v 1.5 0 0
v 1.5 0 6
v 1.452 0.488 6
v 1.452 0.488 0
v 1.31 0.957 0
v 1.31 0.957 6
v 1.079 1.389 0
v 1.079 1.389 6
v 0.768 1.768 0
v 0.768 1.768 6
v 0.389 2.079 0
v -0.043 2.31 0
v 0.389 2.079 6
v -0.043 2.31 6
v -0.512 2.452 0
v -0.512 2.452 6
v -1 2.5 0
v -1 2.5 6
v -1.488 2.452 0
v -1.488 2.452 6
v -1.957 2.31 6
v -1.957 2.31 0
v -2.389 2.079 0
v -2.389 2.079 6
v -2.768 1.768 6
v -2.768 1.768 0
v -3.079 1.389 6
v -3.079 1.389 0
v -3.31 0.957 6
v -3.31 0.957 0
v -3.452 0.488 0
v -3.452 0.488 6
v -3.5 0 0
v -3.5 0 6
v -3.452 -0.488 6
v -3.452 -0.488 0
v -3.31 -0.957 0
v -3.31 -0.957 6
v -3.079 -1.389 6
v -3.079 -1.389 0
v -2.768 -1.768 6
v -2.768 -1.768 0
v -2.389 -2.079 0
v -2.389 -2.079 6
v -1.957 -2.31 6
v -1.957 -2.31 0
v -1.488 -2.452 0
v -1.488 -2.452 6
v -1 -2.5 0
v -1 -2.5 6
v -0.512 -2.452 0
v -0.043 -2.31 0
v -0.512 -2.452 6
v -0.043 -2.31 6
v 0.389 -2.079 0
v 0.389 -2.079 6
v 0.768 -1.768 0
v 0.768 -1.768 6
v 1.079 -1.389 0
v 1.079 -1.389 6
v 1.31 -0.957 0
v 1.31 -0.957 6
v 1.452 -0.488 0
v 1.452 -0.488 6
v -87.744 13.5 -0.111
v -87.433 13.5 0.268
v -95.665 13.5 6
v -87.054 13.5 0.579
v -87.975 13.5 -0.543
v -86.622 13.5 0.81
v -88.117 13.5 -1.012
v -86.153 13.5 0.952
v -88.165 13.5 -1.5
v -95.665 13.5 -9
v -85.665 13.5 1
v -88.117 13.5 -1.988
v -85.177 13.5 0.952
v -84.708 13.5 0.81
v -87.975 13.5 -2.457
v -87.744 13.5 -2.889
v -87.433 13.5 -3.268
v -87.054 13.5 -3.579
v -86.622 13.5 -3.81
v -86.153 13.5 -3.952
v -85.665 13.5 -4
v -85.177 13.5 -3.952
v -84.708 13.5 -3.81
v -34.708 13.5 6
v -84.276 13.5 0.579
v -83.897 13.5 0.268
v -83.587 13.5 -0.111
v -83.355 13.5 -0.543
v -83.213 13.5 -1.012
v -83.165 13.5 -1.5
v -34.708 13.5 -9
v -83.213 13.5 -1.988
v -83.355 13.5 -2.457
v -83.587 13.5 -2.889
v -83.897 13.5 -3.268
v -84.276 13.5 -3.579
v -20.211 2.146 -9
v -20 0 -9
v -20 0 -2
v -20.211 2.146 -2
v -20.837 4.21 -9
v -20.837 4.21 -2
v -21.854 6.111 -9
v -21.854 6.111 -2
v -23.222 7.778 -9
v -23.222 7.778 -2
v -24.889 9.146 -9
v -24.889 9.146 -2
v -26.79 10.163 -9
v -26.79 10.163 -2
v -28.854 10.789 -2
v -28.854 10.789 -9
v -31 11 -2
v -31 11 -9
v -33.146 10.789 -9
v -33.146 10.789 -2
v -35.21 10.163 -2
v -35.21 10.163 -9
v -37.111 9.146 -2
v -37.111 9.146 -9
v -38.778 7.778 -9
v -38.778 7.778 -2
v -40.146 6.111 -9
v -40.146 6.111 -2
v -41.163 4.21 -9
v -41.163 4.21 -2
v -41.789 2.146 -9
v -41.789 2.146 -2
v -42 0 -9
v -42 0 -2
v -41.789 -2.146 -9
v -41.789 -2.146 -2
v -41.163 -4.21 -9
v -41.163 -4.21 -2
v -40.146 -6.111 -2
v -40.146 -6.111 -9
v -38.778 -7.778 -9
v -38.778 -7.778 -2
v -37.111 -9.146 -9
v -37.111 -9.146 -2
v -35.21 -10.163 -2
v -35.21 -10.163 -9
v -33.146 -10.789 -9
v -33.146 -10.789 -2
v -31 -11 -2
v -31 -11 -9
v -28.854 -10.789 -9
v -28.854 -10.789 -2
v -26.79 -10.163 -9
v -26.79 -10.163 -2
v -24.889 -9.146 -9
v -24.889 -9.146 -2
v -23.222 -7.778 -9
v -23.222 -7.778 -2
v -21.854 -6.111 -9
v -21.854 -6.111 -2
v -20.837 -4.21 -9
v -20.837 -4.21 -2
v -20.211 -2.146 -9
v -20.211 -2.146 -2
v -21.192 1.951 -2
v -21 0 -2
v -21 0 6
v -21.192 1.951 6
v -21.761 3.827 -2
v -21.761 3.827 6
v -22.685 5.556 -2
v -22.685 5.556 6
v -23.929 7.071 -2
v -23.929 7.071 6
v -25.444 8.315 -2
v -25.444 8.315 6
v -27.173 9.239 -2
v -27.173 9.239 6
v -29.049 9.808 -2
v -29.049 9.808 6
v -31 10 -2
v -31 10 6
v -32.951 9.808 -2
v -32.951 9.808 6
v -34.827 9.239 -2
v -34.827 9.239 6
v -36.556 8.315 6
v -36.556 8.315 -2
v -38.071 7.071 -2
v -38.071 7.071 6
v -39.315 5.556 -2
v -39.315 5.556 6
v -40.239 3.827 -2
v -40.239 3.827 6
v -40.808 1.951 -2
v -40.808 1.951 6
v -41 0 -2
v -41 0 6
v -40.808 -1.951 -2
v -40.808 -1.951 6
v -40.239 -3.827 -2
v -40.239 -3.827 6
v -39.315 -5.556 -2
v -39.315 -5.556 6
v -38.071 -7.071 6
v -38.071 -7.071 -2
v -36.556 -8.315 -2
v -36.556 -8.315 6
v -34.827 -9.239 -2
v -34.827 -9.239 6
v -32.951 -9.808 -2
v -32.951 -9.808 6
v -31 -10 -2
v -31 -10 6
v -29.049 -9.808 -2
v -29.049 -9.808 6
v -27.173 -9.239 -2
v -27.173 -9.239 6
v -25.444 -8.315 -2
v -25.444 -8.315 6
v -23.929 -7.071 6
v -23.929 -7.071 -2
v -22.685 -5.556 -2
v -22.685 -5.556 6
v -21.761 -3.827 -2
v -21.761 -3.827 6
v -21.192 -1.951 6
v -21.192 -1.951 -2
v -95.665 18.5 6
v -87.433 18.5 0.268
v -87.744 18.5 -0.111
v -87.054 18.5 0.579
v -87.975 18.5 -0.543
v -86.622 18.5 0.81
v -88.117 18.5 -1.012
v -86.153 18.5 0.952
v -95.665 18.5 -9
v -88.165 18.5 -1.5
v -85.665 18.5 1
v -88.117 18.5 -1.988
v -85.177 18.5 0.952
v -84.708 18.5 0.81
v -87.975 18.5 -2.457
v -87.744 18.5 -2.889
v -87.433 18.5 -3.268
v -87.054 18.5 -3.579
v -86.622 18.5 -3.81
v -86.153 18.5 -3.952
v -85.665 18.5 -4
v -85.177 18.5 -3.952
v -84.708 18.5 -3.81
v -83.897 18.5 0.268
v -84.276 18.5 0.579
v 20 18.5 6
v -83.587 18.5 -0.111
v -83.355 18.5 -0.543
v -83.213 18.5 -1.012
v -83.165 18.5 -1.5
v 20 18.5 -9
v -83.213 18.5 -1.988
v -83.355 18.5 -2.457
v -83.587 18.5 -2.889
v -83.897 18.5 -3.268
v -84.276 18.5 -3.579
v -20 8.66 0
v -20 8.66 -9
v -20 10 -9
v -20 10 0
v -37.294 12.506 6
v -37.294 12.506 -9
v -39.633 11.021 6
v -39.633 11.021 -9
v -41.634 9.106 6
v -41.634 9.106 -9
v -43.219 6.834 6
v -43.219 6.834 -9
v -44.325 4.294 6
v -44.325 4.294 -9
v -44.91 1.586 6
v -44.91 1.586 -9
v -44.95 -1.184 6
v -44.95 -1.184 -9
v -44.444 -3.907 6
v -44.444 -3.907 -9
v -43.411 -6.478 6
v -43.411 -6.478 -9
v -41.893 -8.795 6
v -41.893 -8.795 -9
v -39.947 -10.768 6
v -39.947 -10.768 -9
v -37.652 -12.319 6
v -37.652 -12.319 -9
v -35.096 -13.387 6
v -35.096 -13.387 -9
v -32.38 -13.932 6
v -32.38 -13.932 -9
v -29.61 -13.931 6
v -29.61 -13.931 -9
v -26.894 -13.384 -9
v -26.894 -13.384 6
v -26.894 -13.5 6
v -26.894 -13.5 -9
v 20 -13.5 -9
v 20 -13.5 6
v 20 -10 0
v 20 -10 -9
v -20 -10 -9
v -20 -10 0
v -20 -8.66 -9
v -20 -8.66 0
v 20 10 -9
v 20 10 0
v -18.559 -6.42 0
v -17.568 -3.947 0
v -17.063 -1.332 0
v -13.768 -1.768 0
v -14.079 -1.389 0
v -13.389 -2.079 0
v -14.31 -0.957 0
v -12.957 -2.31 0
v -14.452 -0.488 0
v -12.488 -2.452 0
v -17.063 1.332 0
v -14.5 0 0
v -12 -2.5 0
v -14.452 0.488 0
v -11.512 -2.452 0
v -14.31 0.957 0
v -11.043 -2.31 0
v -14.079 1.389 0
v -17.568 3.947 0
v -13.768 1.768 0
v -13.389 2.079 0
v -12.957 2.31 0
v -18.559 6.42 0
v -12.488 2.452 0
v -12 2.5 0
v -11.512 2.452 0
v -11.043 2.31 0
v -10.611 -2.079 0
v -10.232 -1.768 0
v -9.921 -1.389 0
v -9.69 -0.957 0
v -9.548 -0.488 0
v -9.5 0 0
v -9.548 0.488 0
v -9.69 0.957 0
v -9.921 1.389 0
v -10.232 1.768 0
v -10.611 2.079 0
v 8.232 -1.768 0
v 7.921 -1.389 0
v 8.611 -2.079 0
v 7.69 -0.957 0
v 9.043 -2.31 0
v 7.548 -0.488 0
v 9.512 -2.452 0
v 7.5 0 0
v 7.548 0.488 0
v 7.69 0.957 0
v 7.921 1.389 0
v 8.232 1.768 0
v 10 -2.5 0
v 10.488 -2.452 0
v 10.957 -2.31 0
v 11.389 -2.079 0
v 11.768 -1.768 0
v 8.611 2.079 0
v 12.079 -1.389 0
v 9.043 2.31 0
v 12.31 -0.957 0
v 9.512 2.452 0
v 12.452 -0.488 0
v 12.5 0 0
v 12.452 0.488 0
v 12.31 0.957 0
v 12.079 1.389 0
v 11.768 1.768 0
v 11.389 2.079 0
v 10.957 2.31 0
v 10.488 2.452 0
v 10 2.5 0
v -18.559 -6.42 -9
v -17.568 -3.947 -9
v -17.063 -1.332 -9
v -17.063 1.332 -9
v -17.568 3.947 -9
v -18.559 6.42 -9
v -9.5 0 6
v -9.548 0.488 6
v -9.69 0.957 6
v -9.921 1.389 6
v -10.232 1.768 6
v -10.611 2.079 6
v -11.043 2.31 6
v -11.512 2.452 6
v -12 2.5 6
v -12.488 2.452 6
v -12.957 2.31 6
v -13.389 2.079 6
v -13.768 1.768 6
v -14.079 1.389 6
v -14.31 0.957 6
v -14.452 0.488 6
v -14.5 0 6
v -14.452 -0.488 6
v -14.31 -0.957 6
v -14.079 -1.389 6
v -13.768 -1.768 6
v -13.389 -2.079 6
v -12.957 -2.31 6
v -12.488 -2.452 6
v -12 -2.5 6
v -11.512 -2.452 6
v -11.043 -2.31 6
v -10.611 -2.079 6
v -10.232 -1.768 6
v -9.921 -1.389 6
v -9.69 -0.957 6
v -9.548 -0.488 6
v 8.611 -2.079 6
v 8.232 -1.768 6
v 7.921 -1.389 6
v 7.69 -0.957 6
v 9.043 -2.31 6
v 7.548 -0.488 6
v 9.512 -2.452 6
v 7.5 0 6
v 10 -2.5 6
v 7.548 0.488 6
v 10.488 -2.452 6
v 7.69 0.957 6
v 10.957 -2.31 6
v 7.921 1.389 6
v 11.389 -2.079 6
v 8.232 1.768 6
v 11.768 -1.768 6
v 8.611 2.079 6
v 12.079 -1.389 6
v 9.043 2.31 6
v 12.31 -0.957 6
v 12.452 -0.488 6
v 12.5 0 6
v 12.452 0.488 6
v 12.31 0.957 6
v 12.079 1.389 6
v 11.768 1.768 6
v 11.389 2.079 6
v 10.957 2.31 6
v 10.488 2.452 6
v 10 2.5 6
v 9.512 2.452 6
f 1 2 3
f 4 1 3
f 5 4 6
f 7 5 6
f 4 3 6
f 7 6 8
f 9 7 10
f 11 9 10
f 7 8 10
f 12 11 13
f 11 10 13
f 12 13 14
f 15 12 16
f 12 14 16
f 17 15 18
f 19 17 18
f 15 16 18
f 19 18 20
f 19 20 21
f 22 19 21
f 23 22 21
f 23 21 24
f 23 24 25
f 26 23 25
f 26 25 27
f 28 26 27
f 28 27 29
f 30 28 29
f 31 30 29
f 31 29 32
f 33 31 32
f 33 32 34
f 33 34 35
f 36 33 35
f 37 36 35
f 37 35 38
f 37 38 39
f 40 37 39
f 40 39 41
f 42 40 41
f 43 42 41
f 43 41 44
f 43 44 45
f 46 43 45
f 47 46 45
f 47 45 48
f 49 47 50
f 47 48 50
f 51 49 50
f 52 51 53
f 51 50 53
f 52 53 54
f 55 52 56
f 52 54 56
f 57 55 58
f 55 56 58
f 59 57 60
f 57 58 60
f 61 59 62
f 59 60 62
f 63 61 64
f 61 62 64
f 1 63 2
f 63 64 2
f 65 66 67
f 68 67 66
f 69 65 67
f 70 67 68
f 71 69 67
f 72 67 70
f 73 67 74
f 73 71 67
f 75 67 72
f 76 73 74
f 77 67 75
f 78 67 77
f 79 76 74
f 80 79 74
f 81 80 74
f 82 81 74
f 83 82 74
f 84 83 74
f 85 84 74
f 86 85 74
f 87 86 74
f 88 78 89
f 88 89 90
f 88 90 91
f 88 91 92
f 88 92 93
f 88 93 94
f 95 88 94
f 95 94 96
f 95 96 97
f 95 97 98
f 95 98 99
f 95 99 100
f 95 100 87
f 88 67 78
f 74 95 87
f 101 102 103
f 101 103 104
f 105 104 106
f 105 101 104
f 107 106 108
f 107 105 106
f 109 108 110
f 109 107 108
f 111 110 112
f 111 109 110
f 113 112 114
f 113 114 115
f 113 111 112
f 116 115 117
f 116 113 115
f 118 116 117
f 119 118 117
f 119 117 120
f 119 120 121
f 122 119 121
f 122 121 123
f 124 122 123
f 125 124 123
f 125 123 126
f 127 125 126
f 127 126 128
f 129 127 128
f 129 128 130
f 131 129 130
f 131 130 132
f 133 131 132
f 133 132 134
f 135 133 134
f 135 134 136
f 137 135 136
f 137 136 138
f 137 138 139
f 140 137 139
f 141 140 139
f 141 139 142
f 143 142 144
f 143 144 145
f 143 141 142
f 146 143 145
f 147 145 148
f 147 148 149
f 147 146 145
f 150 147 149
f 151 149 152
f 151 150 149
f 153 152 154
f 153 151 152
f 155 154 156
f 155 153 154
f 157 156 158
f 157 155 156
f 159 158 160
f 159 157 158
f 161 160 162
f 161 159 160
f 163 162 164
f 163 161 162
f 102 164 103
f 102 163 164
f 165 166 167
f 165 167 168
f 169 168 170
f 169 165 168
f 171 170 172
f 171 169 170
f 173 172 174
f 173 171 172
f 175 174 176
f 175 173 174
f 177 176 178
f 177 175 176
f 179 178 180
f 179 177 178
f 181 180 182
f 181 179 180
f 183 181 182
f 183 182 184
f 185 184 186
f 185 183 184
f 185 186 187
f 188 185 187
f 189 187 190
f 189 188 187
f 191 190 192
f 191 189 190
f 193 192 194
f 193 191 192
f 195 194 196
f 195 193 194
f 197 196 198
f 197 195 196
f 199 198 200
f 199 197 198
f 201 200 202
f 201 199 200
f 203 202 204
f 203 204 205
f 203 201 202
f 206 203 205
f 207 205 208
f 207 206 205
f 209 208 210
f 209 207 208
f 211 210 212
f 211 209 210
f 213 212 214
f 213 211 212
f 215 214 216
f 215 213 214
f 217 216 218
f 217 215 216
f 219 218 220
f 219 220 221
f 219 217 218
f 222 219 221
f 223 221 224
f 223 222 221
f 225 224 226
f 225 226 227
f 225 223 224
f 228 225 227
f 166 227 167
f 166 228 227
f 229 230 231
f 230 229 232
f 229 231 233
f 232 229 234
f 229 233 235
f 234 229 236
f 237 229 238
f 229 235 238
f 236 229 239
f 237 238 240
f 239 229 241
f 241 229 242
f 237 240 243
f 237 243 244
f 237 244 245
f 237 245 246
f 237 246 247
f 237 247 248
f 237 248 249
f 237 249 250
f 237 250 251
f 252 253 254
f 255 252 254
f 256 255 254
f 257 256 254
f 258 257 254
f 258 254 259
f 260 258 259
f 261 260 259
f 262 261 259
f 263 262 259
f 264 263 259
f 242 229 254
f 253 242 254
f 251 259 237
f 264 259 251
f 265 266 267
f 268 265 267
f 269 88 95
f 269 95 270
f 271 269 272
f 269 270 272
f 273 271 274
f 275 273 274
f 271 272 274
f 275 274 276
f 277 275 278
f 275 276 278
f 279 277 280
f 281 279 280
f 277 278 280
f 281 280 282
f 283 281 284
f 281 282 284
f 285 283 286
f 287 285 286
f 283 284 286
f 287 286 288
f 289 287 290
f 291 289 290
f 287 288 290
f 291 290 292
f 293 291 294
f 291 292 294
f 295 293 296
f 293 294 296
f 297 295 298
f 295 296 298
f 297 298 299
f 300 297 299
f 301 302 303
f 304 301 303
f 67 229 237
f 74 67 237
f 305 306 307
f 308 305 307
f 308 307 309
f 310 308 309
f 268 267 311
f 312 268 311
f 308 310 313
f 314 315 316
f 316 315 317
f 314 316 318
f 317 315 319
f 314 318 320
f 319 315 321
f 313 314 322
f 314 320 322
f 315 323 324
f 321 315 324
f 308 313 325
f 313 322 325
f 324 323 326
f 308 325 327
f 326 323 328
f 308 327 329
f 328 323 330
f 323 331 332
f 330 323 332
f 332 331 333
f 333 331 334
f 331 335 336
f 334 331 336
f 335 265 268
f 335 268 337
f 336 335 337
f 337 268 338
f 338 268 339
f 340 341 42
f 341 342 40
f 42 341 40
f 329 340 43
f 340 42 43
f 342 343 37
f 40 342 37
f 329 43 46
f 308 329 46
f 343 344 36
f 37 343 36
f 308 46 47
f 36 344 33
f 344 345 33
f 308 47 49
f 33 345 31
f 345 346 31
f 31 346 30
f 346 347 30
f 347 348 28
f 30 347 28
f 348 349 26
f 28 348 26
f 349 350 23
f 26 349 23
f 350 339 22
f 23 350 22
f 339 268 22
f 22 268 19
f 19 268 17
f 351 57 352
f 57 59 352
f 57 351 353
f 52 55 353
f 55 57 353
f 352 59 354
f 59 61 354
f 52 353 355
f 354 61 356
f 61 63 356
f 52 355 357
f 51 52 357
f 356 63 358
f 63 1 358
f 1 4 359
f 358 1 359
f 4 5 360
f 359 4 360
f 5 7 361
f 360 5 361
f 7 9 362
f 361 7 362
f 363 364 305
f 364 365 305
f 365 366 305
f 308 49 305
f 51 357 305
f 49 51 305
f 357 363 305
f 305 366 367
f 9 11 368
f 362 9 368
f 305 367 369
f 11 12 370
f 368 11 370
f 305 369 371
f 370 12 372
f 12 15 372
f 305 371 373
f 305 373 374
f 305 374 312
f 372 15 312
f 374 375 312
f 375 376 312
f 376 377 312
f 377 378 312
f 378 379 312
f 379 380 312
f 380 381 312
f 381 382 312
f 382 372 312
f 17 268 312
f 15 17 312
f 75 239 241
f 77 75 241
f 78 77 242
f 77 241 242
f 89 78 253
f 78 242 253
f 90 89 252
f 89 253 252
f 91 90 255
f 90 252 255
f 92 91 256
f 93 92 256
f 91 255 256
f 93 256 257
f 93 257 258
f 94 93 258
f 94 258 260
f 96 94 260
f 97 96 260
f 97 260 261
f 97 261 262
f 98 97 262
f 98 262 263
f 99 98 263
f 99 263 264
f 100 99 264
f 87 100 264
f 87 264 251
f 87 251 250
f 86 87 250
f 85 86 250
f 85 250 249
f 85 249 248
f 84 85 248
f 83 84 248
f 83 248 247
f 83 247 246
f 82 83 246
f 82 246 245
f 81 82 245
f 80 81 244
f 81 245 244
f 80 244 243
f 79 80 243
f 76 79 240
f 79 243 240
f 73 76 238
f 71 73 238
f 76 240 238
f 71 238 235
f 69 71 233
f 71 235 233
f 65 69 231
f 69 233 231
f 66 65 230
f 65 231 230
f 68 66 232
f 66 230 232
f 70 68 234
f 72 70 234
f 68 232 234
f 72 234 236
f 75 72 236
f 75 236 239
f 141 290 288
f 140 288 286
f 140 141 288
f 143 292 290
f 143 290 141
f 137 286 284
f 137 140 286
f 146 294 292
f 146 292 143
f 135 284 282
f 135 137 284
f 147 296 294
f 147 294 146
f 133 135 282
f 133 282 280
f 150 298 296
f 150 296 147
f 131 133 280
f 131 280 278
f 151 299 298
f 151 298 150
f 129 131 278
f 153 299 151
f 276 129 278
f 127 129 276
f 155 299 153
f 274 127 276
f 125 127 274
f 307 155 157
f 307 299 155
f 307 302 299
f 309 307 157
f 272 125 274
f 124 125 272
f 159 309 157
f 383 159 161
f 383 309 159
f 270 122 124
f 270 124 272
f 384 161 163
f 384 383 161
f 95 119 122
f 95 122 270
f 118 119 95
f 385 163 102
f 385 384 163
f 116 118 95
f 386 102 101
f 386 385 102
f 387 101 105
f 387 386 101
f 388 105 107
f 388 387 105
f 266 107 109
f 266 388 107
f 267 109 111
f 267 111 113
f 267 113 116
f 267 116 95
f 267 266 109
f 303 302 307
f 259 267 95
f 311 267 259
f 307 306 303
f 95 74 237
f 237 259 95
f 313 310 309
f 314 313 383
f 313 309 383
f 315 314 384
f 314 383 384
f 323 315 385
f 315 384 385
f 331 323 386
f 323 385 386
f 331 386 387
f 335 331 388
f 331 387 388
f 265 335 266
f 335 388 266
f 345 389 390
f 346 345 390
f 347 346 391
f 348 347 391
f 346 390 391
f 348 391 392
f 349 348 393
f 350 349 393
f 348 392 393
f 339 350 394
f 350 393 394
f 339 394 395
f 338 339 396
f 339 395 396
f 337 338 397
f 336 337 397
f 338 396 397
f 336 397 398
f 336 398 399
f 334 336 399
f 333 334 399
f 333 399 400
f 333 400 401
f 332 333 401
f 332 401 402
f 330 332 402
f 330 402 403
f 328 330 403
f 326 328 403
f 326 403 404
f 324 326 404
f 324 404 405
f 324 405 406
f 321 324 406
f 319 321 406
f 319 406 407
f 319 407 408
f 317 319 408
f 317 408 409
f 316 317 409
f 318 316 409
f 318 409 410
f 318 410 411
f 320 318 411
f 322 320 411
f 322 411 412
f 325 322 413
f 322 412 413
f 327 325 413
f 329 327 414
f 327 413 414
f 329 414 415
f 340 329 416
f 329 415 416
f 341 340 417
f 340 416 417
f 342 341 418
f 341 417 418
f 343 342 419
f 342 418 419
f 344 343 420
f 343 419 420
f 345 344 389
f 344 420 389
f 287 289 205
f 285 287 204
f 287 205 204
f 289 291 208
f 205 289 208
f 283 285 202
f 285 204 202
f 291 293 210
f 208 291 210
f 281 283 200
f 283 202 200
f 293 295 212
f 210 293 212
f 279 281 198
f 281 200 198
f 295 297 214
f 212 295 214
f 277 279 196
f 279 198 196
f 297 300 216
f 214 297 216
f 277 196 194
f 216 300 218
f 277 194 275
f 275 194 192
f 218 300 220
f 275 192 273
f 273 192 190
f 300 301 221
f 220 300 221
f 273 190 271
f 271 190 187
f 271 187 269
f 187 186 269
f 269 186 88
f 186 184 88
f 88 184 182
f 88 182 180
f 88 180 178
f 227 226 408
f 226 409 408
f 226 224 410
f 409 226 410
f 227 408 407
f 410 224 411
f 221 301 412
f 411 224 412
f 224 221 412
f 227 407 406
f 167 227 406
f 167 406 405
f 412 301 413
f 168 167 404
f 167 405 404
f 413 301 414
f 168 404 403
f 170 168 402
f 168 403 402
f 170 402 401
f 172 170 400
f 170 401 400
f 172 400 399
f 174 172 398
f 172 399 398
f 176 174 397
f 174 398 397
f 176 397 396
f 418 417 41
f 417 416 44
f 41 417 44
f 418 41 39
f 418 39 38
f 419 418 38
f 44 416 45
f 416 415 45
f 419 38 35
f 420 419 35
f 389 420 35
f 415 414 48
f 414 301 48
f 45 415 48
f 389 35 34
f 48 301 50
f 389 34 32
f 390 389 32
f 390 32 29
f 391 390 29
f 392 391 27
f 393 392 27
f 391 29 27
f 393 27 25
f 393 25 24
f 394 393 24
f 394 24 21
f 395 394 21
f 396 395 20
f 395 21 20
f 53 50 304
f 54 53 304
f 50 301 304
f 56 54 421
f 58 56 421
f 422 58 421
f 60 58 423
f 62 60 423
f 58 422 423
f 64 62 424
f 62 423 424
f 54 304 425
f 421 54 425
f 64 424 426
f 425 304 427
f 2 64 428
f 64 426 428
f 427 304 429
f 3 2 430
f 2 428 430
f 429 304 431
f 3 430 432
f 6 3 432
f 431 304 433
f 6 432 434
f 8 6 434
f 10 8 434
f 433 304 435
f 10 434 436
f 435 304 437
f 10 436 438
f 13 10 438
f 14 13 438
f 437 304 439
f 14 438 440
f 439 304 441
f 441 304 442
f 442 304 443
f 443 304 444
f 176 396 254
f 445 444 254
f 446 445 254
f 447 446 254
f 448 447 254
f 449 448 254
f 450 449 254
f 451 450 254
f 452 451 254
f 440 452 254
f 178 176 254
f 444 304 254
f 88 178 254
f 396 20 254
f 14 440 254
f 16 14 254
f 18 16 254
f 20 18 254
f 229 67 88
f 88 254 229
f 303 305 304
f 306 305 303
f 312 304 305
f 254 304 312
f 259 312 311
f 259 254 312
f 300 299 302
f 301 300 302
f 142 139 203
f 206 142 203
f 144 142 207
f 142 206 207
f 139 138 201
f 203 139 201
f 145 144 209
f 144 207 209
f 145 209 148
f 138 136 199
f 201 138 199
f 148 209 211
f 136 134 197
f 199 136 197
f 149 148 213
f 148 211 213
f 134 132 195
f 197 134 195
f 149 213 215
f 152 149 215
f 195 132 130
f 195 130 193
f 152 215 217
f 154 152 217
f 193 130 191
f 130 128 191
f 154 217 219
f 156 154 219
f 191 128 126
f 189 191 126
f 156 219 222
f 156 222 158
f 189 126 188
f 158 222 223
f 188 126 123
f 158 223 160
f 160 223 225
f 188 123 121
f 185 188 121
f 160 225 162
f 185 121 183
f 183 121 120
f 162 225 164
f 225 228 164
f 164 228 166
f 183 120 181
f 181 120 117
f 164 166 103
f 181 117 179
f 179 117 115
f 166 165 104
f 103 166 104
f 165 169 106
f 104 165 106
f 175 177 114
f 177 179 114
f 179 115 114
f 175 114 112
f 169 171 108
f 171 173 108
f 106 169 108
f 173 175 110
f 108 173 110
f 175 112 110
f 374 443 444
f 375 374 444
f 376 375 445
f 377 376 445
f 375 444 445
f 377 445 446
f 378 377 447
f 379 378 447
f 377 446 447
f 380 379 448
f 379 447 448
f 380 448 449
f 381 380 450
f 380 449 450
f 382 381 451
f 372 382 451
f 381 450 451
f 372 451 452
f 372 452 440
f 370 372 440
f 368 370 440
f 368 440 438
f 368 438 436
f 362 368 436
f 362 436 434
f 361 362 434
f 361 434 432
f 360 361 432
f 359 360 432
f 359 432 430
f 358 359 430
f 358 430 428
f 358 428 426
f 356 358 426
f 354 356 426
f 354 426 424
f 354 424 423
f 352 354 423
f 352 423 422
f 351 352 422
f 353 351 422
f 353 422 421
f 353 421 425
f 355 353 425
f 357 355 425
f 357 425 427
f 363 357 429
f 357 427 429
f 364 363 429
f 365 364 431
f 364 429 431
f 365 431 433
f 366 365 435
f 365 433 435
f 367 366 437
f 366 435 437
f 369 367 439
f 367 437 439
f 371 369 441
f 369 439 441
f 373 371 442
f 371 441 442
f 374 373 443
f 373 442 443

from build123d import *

# Parameters (mm, degrees)
SKETCH_1_W          = 40
SKETCH_1_H          = 20
EXTRUDE_1_DEPTH     = 6
SKETCH_2_R          = 2.5
CUT_EXTRUDE_1_DEPTH = 24.151673806
EXTRUDE_START       = -15
EXTRUDE_2_OUTLINE_R = 11
EXTRUDE_2_DEPTH     = 15
EXTRUDE_START_2     = -8
SKETCH_5_R          = 11
SKETCH_5_R_2        = 10
EXTRUDE_3_DEPTH     = 8
SKETCH_8_W          = 15
SKETCH_8_H          = 5
EXTRUDE_4_DEPTH     = 200
SKETCH_9_W          = 4.403653586
SKETCH_9_H          = 3.736433346
EXTRUDE_5_DEPTH     = 15
SKETCH_13_W         = 87.445921981
SKETCH_13_H         = 18.524474632
CUT_EXTRUDE_2_DEPTH = 184.131783151
SKETCH_14_R         = 2.5
CUT_EXTRUDE_3_DEPTH = 10


# Read off the part's stored shape, not the designer's step: 凸台-拉伸2
with BuildPart() as part:
    # 草图1 → 凸台-拉伸1 (new body)
    with BuildSketch(Plane.XY):
        Rectangle(SKETCH_1_W, SKETCH_1_H)
    extrude(amount=EXTRUDE_1_DEPTH)

    # 草图2 → 切除-拉伸1 (cut, through all)
    with BuildSketch(Plane.XY.offset(6)):
        with Locations((10, 0)):
            Circle(SKETCH_2_R)
        with Locations((-1, 0)):
            Circle(SKETCH_2_R)
        with Locations((-12, 0)):
            Circle(SKETCH_2_R)
    extrude(amount=-CUT_EXTRUDE_1_DEPTH, mode=Mode.SUBTRACT)

    # 凸台-拉伸2 outline → 凸台-拉伸2 (add)
    with BuildSketch(Plane.XY.offset(6).offset(EXTRUDE_START)):
        with BuildLine():
            Line((20, 10), (20, 13.5))
            Line((20, 13.5), (-26.893967141, 13.5))
            Line((-26.893967141, 13.5), (-26.893967141, 13.384337644))
            ThreePointArc((-26.893967141, 13.384337644), (-45, 0), (-26.893967141, -13.384337644))
            Line((-26.893967141, -13.384337644), (-26.893967141, -13.5))
            Line((-26.893967141, -13.5), (20, -13.5))
            Line((20, -13.5), (20, -10))
            Line((20, -10), (-20, -10))
            Line((-20, -10), (-20, -8.660254038))
            ThreePointArc((-20, -8.660254038), (-17, 0), (-20, 8.660254038))
            Line((-20, 8.660254038), (-20, 10))
            Line((-20, 10), (20, 10))
        make_face()
        with Locations((-31, 0)):
            Circle(EXTRUDE_2_OUTLINE_R, mode=Mode.SUBTRACT)
    extrude(amount=EXTRUDE_2_DEPTH)

    # 草图5 → 凸台-拉伸3 (add)
    with BuildSketch(Plane.XY.offset(6).offset(EXTRUDE_START_2)):
        with Locations((-31, 0)):
            Circle(SKETCH_5_R)
        with Locations((-31, 0)):
            Circle(SKETCH_5_R_2, mode=Mode.SUBTRACT)
    extrude(amount=EXTRUDE_3_DEPTH)

    # 草图8 → 凸台-拉伸4 (add)
    with BuildSketch(Plane(origin=(20, 0, 0), x_dir=(0, 0, -1), z_dir=(1, 0, 0))):
        with Locations((1.5, 16)):
            Rectangle(SKETCH_8_W, SKETCH_8_H)
    extrude(amount=-EXTRUDE_4_DEPTH)

    # 草图9 → 凸台-拉伸5 (add, through all)
    with BuildSketch(Plane.XY.offset(6)):
        with Locations((-27.364497847, 13.796597935)):
            Rectangle(SKETCH_9_W, SKETCH_9_H)
    extrude(amount=-EXTRUDE_5_DEPTH)

    # 草图13 → 切除-拉伸2 (cut, through all)
    with BuildSketch(Plane(origin=(0, 18.5, 0), x_dir=(1, 0, 0), z_dir=(0, 1, 0))):
        with Locations((-139.388148112, 3.262237316)):
            Rectangle(SKETCH_13_W, SKETCH_13_H)
    extrude(amount=-CUT_EXTRUDE_2_DEPTH, mode=Mode.SUBTRACT)

    # 草图14 → 切除-拉伸3 (cut)
    with BuildSketch(Plane(origin=(0, 18.5, 0), x_dir=(1, 0, 0), z_dir=(0, 1, 0))):
        with Locations(Location((-85.665187121, 1.5, 0), (0, 0, 270))):
            Circle(SKETCH_14_R)
    extrude(amount=-CUT_EXTRUDE_3_DEPTH, mode=Mode.SUBTRACT)


solid = part.part
